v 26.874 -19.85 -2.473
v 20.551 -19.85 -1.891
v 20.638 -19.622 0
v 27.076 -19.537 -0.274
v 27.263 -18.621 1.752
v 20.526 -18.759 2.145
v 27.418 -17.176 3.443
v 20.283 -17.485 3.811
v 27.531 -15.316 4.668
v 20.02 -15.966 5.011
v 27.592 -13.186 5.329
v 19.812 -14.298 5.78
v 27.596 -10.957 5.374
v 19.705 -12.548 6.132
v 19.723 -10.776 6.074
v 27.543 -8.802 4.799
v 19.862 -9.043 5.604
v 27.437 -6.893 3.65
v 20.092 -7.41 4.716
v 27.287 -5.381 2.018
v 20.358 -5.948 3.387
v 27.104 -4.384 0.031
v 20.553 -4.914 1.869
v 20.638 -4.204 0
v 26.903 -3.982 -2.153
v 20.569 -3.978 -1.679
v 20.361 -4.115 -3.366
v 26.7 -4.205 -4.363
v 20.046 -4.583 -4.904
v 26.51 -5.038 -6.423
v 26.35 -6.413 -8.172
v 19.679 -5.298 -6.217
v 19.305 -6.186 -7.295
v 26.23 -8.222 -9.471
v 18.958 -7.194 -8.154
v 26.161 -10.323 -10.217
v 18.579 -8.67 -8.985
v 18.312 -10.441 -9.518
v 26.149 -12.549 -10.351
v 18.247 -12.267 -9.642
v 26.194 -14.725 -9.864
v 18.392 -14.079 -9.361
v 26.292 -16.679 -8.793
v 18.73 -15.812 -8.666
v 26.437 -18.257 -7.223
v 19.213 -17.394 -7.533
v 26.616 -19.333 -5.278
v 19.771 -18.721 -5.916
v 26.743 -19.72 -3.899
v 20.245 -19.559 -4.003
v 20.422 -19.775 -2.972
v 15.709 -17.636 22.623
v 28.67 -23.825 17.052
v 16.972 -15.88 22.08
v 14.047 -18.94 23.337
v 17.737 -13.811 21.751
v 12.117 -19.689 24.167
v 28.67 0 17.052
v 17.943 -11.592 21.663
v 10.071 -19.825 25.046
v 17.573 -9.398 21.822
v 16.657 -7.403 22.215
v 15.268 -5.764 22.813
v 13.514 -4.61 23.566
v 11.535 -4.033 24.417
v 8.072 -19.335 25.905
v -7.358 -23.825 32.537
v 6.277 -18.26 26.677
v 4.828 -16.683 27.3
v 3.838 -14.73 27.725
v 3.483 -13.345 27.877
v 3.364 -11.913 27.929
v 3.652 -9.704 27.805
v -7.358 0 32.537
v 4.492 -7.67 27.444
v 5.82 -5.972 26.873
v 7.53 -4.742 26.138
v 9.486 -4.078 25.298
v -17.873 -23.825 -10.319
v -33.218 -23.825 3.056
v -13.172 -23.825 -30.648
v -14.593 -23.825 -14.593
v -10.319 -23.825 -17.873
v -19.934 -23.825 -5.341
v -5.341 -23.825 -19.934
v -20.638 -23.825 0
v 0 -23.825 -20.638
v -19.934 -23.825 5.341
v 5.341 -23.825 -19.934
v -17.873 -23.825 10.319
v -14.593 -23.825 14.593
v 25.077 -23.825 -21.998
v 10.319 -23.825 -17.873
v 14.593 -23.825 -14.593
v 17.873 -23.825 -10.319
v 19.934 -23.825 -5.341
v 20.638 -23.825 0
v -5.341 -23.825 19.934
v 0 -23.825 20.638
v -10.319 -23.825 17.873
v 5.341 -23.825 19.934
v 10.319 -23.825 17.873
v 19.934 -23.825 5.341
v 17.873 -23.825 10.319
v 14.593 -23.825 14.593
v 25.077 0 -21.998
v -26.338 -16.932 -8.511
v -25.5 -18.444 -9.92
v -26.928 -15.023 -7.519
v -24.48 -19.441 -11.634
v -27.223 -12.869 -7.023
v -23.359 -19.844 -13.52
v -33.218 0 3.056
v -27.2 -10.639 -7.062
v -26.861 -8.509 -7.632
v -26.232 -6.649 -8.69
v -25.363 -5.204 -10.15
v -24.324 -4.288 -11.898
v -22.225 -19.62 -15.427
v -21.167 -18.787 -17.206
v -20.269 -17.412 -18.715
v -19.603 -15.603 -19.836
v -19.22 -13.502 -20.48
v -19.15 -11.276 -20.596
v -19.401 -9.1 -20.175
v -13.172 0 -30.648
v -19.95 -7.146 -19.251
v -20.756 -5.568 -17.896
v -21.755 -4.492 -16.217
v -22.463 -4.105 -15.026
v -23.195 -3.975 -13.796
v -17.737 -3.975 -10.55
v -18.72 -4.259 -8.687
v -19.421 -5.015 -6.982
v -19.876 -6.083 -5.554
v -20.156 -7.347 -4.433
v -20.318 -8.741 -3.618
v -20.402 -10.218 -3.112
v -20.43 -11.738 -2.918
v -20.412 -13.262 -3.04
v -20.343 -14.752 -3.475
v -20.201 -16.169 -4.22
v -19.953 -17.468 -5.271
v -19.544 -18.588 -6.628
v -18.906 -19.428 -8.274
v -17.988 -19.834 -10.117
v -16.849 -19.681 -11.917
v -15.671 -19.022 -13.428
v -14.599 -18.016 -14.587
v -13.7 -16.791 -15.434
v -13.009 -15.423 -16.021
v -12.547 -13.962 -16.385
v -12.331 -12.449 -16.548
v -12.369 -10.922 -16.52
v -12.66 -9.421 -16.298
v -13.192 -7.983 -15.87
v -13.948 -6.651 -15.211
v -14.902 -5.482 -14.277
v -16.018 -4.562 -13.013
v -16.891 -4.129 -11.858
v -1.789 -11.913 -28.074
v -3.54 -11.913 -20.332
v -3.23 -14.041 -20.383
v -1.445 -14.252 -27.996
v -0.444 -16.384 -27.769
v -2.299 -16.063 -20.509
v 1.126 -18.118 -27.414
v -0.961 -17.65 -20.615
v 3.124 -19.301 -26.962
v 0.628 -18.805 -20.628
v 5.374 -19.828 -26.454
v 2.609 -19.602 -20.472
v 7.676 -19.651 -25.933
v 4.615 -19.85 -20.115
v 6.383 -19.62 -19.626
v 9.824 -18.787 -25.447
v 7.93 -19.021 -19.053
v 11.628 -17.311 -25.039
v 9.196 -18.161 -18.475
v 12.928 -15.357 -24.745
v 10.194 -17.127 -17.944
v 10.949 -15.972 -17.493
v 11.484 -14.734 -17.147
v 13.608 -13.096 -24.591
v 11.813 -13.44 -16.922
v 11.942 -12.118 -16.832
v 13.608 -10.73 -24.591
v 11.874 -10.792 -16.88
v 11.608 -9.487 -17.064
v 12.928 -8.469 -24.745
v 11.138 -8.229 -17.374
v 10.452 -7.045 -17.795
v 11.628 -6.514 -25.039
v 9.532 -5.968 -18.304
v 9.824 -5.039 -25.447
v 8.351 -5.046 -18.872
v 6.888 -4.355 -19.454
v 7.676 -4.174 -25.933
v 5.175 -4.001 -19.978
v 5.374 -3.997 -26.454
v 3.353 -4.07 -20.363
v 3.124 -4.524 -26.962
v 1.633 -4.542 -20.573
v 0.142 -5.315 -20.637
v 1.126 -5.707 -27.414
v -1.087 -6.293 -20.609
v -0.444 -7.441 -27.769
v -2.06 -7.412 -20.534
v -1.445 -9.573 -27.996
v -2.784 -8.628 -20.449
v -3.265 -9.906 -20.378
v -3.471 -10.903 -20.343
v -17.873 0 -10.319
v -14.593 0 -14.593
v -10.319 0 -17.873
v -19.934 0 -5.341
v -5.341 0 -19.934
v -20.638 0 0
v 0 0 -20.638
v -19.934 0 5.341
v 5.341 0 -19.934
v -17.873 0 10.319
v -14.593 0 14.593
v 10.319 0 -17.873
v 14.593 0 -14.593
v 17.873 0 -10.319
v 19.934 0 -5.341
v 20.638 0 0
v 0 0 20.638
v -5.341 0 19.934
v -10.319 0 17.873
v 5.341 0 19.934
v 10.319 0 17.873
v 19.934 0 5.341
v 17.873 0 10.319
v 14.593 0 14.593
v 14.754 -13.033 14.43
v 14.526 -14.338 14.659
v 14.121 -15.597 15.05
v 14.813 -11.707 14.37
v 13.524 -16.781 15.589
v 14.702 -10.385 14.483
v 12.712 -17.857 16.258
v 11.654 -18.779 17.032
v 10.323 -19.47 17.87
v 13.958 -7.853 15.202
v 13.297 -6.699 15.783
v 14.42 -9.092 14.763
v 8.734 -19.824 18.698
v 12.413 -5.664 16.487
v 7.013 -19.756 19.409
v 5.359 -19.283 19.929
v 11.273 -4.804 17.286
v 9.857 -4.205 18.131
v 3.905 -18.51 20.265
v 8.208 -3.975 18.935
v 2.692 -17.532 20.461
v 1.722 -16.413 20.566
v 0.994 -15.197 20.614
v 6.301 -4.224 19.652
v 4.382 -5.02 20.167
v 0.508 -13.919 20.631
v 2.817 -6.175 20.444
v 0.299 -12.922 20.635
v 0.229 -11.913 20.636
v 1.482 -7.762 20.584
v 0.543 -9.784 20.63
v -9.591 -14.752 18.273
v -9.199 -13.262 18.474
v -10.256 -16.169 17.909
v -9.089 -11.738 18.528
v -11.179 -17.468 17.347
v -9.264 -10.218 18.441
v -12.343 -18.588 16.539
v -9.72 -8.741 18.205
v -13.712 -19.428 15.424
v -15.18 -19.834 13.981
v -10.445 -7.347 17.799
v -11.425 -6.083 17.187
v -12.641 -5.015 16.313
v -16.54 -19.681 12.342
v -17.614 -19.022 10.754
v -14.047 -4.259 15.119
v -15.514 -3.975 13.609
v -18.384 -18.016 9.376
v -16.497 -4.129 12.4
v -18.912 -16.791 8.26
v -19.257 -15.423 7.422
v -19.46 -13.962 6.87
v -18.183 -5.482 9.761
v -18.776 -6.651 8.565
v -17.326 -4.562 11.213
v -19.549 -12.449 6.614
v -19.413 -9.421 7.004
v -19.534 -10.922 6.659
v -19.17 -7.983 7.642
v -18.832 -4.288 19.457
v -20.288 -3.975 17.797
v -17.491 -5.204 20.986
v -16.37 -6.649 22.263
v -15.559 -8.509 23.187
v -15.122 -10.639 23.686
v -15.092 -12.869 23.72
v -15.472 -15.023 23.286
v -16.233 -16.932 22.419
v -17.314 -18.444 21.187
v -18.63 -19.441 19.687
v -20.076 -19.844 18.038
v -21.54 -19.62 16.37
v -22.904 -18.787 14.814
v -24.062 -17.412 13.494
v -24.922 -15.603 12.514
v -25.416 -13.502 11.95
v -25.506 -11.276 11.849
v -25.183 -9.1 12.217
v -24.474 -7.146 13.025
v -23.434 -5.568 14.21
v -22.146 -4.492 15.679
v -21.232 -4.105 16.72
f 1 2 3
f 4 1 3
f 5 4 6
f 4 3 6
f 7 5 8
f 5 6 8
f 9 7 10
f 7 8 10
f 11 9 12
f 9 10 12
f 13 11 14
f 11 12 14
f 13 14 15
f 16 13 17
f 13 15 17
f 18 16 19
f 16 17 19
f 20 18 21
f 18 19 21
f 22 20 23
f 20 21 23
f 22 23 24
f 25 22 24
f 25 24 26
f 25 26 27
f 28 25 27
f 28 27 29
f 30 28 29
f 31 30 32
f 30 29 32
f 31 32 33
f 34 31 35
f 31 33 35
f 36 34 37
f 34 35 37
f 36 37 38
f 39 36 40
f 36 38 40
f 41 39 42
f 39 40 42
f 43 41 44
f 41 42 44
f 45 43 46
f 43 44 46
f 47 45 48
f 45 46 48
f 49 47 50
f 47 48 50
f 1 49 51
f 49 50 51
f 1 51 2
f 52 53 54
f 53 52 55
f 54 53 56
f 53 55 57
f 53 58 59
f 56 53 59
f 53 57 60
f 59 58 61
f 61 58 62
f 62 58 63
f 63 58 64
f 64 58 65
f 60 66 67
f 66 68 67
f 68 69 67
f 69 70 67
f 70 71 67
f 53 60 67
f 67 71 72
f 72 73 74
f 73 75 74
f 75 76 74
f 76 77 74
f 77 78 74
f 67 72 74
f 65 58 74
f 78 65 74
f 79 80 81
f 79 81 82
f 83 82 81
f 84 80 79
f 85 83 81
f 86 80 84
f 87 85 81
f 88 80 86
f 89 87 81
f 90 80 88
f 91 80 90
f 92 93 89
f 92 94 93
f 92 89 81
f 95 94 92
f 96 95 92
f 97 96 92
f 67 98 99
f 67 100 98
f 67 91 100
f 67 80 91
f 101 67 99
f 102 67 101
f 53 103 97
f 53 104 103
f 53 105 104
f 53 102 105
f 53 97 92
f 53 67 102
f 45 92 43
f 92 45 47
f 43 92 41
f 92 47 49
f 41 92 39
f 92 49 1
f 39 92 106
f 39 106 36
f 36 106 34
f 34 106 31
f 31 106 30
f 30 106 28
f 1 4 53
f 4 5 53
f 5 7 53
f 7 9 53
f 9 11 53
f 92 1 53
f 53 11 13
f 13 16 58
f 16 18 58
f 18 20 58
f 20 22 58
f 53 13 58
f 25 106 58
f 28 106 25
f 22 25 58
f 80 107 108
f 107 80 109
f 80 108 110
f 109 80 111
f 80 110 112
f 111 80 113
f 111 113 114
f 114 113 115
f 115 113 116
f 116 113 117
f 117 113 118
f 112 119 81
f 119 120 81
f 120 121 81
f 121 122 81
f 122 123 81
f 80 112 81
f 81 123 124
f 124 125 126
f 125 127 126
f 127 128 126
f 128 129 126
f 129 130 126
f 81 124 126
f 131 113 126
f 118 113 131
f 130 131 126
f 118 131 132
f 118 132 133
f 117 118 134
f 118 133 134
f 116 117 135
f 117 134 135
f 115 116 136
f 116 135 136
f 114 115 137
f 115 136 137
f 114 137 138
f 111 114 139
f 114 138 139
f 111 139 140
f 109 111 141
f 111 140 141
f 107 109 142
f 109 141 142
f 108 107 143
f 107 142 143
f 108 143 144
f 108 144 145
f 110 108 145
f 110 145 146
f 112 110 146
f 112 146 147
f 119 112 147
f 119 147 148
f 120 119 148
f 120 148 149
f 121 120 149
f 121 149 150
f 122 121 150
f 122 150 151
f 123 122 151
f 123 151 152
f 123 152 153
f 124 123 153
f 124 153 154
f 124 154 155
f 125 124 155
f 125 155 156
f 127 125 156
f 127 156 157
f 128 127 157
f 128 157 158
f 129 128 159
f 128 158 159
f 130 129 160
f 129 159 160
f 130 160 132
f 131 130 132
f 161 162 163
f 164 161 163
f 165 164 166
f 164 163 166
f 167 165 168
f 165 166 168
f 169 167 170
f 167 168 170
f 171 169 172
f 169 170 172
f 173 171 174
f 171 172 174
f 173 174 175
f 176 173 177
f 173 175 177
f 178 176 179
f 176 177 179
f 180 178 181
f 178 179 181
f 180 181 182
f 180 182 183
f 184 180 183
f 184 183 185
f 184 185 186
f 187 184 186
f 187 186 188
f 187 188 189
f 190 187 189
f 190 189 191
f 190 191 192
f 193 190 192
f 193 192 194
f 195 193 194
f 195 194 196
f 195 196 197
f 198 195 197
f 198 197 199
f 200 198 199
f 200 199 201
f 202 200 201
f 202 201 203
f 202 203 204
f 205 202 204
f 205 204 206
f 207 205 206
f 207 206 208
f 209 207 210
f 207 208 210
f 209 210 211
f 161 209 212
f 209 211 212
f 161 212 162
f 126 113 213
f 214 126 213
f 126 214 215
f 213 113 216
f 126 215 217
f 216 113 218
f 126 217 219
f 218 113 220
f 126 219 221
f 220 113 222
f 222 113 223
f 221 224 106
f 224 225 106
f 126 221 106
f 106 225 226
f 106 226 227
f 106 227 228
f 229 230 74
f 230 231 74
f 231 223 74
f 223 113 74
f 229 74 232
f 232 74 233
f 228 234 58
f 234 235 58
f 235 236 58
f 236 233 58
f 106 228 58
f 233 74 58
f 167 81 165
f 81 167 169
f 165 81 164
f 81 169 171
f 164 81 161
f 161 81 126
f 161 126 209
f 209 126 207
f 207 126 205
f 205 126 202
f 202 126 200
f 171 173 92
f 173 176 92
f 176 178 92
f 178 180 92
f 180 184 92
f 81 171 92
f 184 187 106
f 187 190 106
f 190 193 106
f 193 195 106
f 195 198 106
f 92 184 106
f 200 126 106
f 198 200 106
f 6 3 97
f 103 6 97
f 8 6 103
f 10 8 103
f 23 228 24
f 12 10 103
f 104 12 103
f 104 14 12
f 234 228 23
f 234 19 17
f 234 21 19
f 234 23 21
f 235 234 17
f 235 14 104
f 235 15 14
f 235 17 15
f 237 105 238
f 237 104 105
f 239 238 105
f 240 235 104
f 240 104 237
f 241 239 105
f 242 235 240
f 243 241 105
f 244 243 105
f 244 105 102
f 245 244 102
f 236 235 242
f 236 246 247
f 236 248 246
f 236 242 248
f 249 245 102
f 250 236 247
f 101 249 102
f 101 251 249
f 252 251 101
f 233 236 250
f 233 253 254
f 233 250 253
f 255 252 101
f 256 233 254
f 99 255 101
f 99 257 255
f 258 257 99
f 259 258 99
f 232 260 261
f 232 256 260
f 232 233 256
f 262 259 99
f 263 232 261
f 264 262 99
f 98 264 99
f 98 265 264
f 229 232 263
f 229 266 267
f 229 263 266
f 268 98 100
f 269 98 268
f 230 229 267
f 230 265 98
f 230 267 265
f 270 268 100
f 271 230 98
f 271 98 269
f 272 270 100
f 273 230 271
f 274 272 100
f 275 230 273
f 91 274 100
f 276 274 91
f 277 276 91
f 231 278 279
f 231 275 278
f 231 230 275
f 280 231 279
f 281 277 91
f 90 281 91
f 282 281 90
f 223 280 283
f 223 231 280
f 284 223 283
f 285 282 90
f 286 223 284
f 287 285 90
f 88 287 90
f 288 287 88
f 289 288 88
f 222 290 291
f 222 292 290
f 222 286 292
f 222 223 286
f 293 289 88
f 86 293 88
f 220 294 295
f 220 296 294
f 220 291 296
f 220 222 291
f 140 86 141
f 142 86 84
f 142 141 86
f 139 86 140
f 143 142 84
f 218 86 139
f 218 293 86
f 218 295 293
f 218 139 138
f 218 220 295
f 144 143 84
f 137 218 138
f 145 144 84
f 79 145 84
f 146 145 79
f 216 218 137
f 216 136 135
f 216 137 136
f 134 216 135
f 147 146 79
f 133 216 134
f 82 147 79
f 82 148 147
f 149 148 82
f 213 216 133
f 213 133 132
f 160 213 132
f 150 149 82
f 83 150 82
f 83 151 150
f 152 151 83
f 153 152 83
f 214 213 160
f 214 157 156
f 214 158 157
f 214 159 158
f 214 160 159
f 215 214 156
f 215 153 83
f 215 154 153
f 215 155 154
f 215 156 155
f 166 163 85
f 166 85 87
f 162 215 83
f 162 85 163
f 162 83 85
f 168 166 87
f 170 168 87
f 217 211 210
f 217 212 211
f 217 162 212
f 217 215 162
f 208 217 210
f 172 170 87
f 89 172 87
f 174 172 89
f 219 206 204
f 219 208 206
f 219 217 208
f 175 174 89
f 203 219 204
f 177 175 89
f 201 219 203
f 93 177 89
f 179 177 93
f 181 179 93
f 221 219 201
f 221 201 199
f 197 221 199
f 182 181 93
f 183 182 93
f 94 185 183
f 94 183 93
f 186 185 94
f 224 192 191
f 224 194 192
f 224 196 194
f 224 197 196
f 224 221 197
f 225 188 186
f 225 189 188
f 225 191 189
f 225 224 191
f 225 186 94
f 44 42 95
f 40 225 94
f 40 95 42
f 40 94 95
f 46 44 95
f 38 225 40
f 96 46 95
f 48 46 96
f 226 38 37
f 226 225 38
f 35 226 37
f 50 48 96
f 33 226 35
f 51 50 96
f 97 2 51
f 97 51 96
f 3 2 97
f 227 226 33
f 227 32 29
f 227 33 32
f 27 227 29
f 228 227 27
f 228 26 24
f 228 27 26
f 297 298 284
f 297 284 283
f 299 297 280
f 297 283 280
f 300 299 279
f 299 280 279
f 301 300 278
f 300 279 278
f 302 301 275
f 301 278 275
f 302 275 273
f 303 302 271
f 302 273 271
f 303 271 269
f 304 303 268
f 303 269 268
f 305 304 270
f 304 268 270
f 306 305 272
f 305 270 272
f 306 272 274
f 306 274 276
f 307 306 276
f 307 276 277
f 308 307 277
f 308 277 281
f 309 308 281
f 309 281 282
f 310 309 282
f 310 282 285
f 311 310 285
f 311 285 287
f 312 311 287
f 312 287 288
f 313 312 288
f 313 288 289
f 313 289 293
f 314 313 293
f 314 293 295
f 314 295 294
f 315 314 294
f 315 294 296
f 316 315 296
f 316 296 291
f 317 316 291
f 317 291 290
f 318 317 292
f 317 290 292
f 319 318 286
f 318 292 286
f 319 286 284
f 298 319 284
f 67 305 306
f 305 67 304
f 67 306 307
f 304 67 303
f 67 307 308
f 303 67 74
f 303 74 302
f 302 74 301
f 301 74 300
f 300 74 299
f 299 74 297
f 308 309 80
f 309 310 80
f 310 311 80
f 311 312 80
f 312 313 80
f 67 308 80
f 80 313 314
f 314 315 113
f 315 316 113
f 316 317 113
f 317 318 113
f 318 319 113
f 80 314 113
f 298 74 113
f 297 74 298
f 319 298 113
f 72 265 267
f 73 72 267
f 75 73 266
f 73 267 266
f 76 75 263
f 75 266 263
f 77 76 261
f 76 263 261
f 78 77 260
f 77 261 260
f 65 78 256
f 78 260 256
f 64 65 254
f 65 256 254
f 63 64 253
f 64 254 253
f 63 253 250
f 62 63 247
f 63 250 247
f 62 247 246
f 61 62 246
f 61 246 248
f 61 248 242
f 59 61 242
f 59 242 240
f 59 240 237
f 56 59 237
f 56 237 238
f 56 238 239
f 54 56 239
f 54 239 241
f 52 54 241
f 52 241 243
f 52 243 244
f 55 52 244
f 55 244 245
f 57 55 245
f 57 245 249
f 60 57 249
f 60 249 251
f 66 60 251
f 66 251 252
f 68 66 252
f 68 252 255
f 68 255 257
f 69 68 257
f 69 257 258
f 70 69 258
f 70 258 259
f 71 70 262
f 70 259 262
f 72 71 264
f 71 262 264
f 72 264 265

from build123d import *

# Parameters (mm, degrees)
F0_R      = 20.6375
F1_DEPTH  = 23.8252
F3_D      = 15.875
F3_DEPTH  = 12.7
F5_D      = 15.875
F5_DEPTH  = 12.7
F7_D      = 15.875
F7_DEPTH  = 12.7
F9_D      = 15.875
F9_DEPTH  = 12.7
F11_D     = 15.875
F11_DEPTH = 12.7


with BuildPart() as f1:
    # F0 (on Front) → F1 (new body)
    with BuildSketch(Plane.XZ):
        Polygon((-7.358128, 32.536745), (-33.21807, 3.056411), (-13.171768, -30.647779), (25.07747, -21.99778), (28.670496, 17.052403), align=None)
        Circle(F0_R, mode=Mode.SUBTRACT)
    extrude(amount=F1_DEPTH)

    # F3
    with Locations(Plane(origin=(26.873983, 0, -2.472689), x_dir=(0, 1, 0), z_dir=(0.995794, 0, -0.091623))):
        with Locations((-11.9126, 0)):
            Hole(F3_D / 2, depth=F3_DEPTH)

    # F5
    with Locations(Plane(origin=(10.656184, 0, 24.794574), x_dir=(0.918743, 0, -0.394856), z_dir=(0.394856, 0, 0.918743))):
        with Locations((0, -11.9126)):
            Hole(F5_D / 2, depth=F5_DEPTH)

    # F7
    with Locations(Plane(origin=(-23.194919, 0, -13.795684), x_dir=(0, -1, 0), z_dir=(-0.859469, 0, -0.511188))):
        with Locations((11.9126, 0)):
            Hole(F7_D / 2, depth=F7_DEPTH)

    # F9
    with Locations(Plane(origin=(-20.288099, 0, 17.796578), x_dir=(0, -1, 0), z_dir=(-0.751759, 0, 0.659438))):
        with Locations((11.9126, 0)):
            Hole(F9_D / 2, depth=F9_DEPTH)

    # F11
    with Locations(Plane(origin=(5.952851, 0, -26.32278), x_dir=(0.975369, 0, 0.220578), z_dir=(0.220578, 0, -0.975369))):
        with Locations((0, 11.9126)):
            Hole(F11_D / 2, depth=F11_DEPTH)


solid = f1.part
